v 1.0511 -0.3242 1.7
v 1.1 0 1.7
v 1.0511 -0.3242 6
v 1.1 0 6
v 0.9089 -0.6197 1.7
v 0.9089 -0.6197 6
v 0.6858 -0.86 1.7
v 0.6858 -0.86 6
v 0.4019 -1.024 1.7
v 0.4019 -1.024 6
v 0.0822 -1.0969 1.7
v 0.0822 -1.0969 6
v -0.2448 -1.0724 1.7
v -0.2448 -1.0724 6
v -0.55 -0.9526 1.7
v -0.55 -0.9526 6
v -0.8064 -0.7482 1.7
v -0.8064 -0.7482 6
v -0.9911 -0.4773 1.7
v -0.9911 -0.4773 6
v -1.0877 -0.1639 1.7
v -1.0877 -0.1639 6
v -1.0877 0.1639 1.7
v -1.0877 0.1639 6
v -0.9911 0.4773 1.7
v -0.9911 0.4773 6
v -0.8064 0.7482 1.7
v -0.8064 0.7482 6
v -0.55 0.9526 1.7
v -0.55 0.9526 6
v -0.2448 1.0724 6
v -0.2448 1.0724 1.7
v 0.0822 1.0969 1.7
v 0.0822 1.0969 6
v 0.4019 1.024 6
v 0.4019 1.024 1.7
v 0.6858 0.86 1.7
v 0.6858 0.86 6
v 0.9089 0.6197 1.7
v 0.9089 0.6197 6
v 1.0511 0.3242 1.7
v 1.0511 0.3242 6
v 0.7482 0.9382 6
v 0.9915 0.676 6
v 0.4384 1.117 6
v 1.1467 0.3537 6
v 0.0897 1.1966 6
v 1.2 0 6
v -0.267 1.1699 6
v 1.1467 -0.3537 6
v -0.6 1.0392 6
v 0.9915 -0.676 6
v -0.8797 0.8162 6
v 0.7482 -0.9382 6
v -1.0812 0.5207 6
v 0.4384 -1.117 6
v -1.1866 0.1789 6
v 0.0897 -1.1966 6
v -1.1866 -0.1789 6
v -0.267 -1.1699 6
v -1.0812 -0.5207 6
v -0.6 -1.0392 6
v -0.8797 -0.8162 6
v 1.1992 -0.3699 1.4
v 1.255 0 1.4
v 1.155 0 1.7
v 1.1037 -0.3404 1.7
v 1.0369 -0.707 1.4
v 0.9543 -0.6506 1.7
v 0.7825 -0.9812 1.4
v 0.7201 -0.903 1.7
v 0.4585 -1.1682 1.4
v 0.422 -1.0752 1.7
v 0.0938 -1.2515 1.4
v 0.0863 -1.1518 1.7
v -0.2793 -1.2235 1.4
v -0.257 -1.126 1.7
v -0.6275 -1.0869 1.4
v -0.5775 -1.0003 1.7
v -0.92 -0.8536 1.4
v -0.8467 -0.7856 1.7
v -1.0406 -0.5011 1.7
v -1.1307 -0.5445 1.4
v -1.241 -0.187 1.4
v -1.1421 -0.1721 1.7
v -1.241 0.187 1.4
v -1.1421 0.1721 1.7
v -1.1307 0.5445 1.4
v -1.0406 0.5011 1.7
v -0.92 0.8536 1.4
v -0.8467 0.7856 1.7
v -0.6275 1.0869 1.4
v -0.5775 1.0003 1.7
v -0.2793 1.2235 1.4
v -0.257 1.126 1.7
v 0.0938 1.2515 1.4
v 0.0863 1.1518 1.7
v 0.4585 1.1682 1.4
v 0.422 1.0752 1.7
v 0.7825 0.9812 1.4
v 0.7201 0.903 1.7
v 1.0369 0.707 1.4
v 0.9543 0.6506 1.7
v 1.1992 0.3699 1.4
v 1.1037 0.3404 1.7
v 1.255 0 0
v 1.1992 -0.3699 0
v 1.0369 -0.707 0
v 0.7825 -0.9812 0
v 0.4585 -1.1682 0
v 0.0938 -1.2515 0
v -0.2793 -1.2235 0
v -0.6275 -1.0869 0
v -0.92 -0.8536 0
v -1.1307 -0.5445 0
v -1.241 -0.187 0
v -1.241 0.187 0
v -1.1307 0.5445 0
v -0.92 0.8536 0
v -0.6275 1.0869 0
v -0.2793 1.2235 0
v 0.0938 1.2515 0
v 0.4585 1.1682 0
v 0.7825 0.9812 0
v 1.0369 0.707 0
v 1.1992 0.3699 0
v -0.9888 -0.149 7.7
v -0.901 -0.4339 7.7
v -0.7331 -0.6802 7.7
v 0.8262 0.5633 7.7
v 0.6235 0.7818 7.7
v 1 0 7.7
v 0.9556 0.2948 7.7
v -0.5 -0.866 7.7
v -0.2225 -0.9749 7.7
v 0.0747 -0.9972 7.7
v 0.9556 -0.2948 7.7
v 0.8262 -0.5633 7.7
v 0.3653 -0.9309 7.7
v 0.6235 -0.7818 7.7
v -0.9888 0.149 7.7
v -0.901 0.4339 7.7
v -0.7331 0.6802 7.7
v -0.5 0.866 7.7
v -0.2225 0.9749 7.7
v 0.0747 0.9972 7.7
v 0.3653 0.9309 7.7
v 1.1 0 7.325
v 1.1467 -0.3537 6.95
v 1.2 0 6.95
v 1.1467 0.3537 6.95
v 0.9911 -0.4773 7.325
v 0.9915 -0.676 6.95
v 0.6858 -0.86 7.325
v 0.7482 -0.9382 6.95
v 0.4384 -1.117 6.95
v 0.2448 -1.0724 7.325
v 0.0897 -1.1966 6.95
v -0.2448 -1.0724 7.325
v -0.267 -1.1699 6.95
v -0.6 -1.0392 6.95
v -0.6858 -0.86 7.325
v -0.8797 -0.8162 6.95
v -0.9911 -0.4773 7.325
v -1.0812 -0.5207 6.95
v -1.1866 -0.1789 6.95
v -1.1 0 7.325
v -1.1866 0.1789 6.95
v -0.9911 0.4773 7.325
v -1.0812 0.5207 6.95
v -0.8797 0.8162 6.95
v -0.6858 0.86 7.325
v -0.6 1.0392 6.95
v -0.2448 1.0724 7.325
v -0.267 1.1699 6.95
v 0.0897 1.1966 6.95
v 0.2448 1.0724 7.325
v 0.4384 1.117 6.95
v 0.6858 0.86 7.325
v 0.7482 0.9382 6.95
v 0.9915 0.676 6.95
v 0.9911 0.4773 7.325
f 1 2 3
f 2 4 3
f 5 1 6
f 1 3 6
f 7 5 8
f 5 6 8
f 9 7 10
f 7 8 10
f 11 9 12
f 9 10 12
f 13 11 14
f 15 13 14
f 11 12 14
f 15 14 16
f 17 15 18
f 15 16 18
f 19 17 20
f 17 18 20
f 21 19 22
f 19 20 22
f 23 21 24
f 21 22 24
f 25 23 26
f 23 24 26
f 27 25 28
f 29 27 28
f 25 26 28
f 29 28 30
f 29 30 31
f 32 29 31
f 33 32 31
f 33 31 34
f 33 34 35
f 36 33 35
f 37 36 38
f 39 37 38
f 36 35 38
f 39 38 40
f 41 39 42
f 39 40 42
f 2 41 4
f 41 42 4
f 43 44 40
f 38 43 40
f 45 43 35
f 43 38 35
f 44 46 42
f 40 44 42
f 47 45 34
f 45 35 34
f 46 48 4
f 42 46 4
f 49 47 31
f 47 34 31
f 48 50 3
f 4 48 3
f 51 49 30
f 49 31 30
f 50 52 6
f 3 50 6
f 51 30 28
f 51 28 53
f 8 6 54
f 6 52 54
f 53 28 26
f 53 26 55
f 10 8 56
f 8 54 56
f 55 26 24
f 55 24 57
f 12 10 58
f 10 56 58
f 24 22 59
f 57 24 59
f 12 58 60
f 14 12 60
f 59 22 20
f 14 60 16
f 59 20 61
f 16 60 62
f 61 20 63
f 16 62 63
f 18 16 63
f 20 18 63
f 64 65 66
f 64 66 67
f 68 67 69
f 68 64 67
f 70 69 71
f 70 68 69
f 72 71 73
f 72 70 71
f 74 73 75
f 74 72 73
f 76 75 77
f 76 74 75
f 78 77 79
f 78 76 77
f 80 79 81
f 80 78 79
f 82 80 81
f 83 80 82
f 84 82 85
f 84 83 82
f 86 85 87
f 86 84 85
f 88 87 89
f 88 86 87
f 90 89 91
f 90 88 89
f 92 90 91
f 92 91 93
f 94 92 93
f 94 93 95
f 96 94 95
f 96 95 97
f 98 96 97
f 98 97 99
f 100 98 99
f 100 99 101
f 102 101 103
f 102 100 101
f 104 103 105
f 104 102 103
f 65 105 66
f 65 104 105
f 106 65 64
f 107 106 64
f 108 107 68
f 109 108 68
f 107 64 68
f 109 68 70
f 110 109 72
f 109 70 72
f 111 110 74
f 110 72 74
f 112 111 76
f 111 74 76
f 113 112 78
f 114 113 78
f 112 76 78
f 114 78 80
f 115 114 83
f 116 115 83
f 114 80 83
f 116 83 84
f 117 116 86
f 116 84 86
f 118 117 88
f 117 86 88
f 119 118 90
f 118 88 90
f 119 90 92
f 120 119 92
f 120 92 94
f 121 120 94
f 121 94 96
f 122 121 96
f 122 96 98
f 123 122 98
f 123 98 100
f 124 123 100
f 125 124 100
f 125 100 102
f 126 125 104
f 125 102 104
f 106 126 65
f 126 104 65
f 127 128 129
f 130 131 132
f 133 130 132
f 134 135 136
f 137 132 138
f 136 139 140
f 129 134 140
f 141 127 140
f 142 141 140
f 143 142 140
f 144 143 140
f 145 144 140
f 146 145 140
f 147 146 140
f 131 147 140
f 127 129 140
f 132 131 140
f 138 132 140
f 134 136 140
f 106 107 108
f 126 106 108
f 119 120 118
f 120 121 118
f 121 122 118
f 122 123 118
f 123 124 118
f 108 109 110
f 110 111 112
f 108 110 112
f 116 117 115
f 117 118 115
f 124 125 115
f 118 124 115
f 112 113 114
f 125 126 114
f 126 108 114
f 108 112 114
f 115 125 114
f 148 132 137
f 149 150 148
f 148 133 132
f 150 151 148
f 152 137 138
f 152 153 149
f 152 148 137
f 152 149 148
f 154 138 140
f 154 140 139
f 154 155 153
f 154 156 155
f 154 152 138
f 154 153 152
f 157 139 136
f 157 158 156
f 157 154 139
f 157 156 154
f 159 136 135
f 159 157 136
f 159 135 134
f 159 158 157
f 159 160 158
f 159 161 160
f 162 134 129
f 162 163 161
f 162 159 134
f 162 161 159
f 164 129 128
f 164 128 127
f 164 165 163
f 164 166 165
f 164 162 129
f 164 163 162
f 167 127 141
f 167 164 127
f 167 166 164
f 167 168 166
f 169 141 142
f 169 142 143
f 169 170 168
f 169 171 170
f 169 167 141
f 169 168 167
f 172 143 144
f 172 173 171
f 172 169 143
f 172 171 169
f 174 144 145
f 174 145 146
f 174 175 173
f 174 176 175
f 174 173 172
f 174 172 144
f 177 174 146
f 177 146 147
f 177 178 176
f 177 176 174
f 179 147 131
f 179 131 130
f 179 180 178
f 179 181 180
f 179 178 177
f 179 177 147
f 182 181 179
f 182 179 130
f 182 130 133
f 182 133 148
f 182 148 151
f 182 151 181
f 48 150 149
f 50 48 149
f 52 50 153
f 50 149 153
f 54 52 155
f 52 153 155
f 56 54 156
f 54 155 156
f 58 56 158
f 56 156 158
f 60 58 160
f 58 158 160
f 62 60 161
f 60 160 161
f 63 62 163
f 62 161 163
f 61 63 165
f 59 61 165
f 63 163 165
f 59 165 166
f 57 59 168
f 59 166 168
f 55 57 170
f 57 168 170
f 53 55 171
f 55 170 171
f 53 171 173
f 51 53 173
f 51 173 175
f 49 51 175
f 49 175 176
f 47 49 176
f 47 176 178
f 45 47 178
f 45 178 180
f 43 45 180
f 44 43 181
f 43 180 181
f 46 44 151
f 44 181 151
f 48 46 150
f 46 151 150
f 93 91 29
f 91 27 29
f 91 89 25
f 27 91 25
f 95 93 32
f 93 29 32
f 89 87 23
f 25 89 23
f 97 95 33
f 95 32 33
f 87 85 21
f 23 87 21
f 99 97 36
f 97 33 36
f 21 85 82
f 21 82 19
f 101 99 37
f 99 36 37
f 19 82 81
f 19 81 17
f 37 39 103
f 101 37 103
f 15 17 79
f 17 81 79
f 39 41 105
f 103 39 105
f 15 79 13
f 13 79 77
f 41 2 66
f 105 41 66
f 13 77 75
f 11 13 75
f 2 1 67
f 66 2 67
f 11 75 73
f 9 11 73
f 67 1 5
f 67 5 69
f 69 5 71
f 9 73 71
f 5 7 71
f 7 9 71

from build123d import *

# Parameters (mm, degrees)
F2_SIZE2 = 0.75
F2_SIZE  = 0.2
F3_SIZE2 = 0.3
F3_SIZE  = 0.1


with BuildPart() as f1:
    # F0 (on Front) → F1 (revolve)
    with BuildSketch(Plane.XZ):
        Polygon((1.2, 7.7), (0, 7.7), (0, 0), (1.255, 0), (1.255, 1.7), (1.1, 1.7), (1.1, 6), (1.2, 6), align=None)
    revolve(axis=Axis((0, 0, 3.85), (0, 0, -1)))

    # F2
    f2_edges = [f1.edges().sort_by_distance(p)[0] for p in [
        (-1.2, 0, 7.7),
    ]]
    chamfer(f2_edges, length=F2_SIZE, length2=F2_SIZE2)

    # F3
    f3_edges = [f1.edges().sort_by_distance(p)[0] for p in [
        (-1.255, 0, 1.7),
    ]]
    chamfer(f3_edges, length=F3_SIZE, length2=F3_SIZE2)


solid = f1.part
